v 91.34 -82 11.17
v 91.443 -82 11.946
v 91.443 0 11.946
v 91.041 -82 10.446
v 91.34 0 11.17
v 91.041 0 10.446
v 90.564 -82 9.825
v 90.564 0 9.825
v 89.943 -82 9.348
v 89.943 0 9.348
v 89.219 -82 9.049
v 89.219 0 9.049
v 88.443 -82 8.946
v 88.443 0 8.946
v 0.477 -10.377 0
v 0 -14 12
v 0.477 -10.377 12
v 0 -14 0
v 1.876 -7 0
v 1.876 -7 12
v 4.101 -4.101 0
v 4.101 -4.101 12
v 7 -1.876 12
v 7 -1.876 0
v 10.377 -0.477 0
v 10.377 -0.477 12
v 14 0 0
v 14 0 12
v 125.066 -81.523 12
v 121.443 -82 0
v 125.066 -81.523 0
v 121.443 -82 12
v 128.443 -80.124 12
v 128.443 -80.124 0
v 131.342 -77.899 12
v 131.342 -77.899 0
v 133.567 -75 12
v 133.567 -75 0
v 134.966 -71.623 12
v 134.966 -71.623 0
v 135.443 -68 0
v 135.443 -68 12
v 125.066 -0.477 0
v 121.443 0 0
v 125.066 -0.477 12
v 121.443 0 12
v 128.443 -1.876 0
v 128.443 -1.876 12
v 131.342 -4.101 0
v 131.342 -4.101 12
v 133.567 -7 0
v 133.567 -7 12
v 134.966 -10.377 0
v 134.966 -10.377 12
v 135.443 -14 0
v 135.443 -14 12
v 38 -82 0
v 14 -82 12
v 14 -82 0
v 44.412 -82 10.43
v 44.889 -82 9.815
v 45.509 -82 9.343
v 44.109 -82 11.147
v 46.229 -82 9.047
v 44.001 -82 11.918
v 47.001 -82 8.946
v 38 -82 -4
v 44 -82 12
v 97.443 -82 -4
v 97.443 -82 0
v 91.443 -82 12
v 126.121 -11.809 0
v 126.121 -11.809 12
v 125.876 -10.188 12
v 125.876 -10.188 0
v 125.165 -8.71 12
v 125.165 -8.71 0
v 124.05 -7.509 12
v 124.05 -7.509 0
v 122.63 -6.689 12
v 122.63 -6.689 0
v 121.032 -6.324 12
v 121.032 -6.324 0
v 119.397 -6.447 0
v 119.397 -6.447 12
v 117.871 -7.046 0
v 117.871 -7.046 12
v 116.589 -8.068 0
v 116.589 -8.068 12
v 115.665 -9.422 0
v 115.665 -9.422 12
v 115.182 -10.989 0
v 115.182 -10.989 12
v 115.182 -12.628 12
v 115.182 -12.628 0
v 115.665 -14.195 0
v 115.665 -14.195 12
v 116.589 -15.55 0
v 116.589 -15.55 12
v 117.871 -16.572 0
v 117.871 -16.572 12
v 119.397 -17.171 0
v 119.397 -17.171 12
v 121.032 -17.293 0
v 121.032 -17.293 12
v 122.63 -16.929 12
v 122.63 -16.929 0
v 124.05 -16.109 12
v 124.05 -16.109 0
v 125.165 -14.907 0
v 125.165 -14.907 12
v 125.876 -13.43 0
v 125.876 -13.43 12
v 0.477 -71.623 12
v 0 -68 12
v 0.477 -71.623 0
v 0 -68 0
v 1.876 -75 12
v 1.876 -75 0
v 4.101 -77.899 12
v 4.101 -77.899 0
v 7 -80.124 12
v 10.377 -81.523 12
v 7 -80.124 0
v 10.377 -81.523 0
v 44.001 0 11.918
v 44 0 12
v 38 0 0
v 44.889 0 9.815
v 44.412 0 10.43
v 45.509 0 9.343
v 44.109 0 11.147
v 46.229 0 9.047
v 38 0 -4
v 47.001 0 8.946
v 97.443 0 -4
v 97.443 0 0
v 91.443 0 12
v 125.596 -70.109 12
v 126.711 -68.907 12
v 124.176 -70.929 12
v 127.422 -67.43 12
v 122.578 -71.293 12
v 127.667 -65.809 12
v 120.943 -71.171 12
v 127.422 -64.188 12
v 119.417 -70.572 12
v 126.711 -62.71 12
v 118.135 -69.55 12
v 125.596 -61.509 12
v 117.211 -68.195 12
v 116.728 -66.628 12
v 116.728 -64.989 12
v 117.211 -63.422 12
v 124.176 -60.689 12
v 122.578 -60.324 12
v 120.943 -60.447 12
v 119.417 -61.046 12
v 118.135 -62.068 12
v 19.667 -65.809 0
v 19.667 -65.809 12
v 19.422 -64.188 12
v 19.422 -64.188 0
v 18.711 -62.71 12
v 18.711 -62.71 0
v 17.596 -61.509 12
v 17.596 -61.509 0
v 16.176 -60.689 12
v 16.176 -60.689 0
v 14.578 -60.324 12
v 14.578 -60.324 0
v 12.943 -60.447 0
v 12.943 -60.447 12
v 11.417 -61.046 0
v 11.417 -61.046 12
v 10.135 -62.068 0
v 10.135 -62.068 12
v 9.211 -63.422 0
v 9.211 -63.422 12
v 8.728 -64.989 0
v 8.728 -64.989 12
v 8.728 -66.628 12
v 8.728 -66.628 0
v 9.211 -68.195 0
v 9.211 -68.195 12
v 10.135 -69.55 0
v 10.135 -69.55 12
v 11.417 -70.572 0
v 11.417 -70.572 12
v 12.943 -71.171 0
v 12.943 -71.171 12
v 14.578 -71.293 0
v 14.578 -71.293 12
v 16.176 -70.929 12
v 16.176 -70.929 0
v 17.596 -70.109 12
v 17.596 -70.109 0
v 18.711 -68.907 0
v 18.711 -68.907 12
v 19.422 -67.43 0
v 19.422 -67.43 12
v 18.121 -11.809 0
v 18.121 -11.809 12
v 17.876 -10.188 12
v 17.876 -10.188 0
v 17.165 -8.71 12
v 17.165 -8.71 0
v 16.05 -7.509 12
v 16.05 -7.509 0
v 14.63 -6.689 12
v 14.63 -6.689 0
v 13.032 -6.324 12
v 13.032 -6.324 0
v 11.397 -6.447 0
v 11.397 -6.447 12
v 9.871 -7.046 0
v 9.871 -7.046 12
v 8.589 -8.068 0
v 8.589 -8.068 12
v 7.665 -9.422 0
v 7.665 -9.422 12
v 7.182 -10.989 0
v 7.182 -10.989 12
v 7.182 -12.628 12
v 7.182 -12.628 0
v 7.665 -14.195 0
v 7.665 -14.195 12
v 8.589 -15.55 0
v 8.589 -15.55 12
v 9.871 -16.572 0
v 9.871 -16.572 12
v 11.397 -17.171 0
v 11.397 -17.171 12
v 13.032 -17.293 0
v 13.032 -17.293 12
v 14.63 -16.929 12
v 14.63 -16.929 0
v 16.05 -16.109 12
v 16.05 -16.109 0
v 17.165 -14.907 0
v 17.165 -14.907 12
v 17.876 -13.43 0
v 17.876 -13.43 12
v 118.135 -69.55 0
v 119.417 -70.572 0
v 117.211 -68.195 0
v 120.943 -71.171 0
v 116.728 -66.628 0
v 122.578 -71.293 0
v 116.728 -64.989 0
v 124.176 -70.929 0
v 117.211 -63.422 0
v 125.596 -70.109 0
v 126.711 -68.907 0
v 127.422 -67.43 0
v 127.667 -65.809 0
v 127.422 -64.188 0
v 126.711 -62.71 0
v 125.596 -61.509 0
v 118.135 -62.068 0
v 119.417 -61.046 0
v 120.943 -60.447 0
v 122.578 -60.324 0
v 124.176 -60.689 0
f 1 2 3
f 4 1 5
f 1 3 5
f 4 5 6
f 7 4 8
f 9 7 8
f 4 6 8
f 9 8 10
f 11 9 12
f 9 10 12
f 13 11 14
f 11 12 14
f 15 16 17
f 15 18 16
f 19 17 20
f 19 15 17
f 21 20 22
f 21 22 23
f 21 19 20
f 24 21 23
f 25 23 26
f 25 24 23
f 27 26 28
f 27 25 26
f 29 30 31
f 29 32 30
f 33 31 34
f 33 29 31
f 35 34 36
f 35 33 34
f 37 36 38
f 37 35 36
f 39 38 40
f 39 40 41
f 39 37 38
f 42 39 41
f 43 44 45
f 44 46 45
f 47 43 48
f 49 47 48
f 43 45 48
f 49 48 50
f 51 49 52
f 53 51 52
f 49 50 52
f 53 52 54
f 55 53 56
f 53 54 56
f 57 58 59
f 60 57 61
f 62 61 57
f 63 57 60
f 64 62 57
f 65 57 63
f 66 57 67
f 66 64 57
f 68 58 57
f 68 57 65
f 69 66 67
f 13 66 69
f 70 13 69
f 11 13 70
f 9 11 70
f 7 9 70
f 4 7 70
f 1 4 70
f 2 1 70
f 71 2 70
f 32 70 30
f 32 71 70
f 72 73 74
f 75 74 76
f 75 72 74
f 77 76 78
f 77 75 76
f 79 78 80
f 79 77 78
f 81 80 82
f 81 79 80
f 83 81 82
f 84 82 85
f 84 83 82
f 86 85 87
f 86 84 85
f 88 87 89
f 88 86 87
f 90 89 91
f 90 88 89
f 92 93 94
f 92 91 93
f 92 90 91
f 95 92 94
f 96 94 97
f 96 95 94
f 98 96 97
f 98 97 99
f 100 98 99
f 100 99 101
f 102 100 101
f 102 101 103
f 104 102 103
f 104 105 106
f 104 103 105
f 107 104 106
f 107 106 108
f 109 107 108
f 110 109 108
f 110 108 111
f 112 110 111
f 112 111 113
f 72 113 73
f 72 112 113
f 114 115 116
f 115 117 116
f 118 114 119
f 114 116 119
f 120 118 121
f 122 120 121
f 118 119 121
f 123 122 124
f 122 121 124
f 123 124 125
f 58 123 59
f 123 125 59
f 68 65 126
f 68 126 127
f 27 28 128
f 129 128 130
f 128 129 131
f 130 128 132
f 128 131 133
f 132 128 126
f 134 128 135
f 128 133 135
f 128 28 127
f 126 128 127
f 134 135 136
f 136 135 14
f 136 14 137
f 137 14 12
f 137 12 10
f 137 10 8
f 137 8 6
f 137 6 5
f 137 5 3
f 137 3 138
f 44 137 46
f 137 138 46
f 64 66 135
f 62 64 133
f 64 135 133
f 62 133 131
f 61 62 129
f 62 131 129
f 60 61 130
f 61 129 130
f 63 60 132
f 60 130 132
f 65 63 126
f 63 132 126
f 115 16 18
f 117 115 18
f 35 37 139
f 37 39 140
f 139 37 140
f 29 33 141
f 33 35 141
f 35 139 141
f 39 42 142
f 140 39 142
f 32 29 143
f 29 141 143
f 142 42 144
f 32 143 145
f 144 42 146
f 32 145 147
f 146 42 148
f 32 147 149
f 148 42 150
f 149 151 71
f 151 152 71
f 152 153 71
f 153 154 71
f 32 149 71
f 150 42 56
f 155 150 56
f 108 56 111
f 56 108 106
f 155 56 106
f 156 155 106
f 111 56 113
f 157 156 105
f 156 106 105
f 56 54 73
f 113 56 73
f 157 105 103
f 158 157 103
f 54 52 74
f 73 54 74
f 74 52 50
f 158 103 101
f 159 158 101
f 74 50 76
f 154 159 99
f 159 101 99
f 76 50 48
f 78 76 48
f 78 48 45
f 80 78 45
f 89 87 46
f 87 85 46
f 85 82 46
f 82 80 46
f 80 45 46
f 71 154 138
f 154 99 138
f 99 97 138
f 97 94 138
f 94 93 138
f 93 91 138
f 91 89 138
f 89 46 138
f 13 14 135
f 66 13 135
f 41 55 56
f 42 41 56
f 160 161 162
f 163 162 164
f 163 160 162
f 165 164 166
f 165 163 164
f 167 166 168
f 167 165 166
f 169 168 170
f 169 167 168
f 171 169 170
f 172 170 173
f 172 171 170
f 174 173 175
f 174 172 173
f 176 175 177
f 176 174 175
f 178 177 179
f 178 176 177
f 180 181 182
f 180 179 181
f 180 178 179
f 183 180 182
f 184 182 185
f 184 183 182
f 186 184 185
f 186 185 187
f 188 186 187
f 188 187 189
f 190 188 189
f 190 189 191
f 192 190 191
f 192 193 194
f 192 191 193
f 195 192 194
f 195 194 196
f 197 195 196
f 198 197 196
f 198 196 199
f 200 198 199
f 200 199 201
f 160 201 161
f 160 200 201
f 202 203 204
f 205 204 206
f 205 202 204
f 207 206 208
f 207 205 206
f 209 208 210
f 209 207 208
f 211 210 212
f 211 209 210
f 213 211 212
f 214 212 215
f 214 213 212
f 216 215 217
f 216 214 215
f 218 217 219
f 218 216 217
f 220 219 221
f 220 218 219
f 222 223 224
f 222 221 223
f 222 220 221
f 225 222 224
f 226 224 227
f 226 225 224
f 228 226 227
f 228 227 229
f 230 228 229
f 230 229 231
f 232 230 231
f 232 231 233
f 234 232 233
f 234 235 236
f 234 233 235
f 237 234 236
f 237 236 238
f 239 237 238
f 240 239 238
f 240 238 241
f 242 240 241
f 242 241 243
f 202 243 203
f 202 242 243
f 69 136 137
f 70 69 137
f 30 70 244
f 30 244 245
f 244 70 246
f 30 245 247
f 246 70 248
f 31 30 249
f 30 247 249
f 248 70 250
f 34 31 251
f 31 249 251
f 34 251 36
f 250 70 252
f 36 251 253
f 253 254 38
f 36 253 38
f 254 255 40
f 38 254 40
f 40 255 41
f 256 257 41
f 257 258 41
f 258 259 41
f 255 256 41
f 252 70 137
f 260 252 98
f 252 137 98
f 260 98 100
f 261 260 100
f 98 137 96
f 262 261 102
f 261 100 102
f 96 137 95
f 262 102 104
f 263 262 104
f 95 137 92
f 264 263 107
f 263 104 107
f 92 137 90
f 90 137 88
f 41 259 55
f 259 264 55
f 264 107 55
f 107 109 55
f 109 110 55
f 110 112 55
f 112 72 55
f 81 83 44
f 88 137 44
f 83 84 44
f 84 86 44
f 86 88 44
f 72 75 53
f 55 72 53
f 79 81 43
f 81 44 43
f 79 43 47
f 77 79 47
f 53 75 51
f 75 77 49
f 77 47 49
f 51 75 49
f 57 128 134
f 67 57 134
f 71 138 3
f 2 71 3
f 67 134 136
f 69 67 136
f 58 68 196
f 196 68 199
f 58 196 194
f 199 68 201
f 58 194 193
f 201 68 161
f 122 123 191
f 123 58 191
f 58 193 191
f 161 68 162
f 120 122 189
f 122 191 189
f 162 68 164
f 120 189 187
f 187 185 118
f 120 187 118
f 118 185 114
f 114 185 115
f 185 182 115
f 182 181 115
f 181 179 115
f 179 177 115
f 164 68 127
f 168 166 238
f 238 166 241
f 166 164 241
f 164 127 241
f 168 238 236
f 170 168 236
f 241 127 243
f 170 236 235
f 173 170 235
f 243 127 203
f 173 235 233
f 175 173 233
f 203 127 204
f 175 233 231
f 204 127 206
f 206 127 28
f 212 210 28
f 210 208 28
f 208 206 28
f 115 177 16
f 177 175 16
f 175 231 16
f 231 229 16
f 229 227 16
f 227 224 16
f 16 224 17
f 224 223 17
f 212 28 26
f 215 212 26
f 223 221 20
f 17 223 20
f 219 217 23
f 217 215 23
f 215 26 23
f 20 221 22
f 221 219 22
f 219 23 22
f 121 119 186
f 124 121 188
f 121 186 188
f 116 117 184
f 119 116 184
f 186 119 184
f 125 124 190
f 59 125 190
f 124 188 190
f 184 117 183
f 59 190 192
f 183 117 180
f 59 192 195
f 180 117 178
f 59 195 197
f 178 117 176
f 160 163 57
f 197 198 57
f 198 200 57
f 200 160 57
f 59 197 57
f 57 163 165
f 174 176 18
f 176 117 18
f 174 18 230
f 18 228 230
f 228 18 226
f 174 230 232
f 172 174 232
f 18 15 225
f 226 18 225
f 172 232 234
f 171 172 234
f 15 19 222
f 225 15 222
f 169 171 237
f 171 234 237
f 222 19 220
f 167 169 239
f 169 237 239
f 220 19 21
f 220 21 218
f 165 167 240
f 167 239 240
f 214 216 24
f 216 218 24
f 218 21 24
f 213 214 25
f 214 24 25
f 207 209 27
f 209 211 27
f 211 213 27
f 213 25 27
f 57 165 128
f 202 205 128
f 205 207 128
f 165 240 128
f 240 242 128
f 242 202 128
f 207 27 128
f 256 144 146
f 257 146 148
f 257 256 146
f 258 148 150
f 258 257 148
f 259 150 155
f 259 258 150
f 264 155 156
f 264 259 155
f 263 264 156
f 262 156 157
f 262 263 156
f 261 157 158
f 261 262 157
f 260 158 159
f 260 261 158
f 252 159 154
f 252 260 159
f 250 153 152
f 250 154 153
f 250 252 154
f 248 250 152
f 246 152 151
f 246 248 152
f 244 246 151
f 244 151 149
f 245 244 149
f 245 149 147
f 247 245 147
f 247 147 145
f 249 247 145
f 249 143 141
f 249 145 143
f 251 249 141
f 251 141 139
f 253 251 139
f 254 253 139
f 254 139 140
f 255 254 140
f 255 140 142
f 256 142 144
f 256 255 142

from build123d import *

# Parameters (mm, degrees)
F1_DEPTH = 82
F2_R     = 5.5
F3_DEPTH = 12.001
F4_R     = 14


with BuildPart() as f1:
    # F0 (on Front) → F1 (new body)
    with BuildSketch(Plane.XZ):
        with BuildLine():
            Line((0, 12), (0, 0))
            Line((0, 0), (38, 0))
            Line((38, 0), (38, -4))
            Line((38, -4), (97.442689, -4))
            Line((97.442689, -4), (97.442689, 0))
            Line((97.442689, 0), (135.442689, 0))
            Line((135.442689, 0), (135.442689, 12))
            Line((135.442689, 12), (91.442689, 12))
            Line((91.442689, 12), (91.442689, 11.946312))
            ThreePointArc((91.442689, 11.946312), (90.56401, 9.824992), (88.442689, 8.946312))
            Line((88.442689, 8.946312), (47.000647, 8.946312))
            ThreePointArc((47.000647, 8.946312), (44.889444, 9.814922), (44.000783, 11.917763))
            Line((44.000783, 11.917763), (44, 12))
            Line((44, 12), (0, 12))
        make_face()
    extrude(amount=F1_DEPTH)

    # F2 (on Top) → F3 (cut, through all)
    with BuildSketch(Plane.XY):
        with Locations((12.620713, -11.808709)):
            Circle(F2_R)
        with Locations((120.620713, -11.808709)):
            Circle(F2_R)
        with Locations((14.166683, -65.808709)):
            Circle(F2_R)
        with Locations((122.166683, -65.808709)):
            Circle(F2_R)
    extrude(amount=F3_DEPTH, mode=Mode.SUBTRACT)

    # F4
    f4_edges = [f1.edges().sort_by_distance(p)[0] for p in [
        (135.442689, 0, 6),
        (135.442689, -82, 6),
        (0, -82, 6),
        (0, 0, 6),
    ]]
    fillet(f4_edges, radius=F4_R)


solid = f1.part
